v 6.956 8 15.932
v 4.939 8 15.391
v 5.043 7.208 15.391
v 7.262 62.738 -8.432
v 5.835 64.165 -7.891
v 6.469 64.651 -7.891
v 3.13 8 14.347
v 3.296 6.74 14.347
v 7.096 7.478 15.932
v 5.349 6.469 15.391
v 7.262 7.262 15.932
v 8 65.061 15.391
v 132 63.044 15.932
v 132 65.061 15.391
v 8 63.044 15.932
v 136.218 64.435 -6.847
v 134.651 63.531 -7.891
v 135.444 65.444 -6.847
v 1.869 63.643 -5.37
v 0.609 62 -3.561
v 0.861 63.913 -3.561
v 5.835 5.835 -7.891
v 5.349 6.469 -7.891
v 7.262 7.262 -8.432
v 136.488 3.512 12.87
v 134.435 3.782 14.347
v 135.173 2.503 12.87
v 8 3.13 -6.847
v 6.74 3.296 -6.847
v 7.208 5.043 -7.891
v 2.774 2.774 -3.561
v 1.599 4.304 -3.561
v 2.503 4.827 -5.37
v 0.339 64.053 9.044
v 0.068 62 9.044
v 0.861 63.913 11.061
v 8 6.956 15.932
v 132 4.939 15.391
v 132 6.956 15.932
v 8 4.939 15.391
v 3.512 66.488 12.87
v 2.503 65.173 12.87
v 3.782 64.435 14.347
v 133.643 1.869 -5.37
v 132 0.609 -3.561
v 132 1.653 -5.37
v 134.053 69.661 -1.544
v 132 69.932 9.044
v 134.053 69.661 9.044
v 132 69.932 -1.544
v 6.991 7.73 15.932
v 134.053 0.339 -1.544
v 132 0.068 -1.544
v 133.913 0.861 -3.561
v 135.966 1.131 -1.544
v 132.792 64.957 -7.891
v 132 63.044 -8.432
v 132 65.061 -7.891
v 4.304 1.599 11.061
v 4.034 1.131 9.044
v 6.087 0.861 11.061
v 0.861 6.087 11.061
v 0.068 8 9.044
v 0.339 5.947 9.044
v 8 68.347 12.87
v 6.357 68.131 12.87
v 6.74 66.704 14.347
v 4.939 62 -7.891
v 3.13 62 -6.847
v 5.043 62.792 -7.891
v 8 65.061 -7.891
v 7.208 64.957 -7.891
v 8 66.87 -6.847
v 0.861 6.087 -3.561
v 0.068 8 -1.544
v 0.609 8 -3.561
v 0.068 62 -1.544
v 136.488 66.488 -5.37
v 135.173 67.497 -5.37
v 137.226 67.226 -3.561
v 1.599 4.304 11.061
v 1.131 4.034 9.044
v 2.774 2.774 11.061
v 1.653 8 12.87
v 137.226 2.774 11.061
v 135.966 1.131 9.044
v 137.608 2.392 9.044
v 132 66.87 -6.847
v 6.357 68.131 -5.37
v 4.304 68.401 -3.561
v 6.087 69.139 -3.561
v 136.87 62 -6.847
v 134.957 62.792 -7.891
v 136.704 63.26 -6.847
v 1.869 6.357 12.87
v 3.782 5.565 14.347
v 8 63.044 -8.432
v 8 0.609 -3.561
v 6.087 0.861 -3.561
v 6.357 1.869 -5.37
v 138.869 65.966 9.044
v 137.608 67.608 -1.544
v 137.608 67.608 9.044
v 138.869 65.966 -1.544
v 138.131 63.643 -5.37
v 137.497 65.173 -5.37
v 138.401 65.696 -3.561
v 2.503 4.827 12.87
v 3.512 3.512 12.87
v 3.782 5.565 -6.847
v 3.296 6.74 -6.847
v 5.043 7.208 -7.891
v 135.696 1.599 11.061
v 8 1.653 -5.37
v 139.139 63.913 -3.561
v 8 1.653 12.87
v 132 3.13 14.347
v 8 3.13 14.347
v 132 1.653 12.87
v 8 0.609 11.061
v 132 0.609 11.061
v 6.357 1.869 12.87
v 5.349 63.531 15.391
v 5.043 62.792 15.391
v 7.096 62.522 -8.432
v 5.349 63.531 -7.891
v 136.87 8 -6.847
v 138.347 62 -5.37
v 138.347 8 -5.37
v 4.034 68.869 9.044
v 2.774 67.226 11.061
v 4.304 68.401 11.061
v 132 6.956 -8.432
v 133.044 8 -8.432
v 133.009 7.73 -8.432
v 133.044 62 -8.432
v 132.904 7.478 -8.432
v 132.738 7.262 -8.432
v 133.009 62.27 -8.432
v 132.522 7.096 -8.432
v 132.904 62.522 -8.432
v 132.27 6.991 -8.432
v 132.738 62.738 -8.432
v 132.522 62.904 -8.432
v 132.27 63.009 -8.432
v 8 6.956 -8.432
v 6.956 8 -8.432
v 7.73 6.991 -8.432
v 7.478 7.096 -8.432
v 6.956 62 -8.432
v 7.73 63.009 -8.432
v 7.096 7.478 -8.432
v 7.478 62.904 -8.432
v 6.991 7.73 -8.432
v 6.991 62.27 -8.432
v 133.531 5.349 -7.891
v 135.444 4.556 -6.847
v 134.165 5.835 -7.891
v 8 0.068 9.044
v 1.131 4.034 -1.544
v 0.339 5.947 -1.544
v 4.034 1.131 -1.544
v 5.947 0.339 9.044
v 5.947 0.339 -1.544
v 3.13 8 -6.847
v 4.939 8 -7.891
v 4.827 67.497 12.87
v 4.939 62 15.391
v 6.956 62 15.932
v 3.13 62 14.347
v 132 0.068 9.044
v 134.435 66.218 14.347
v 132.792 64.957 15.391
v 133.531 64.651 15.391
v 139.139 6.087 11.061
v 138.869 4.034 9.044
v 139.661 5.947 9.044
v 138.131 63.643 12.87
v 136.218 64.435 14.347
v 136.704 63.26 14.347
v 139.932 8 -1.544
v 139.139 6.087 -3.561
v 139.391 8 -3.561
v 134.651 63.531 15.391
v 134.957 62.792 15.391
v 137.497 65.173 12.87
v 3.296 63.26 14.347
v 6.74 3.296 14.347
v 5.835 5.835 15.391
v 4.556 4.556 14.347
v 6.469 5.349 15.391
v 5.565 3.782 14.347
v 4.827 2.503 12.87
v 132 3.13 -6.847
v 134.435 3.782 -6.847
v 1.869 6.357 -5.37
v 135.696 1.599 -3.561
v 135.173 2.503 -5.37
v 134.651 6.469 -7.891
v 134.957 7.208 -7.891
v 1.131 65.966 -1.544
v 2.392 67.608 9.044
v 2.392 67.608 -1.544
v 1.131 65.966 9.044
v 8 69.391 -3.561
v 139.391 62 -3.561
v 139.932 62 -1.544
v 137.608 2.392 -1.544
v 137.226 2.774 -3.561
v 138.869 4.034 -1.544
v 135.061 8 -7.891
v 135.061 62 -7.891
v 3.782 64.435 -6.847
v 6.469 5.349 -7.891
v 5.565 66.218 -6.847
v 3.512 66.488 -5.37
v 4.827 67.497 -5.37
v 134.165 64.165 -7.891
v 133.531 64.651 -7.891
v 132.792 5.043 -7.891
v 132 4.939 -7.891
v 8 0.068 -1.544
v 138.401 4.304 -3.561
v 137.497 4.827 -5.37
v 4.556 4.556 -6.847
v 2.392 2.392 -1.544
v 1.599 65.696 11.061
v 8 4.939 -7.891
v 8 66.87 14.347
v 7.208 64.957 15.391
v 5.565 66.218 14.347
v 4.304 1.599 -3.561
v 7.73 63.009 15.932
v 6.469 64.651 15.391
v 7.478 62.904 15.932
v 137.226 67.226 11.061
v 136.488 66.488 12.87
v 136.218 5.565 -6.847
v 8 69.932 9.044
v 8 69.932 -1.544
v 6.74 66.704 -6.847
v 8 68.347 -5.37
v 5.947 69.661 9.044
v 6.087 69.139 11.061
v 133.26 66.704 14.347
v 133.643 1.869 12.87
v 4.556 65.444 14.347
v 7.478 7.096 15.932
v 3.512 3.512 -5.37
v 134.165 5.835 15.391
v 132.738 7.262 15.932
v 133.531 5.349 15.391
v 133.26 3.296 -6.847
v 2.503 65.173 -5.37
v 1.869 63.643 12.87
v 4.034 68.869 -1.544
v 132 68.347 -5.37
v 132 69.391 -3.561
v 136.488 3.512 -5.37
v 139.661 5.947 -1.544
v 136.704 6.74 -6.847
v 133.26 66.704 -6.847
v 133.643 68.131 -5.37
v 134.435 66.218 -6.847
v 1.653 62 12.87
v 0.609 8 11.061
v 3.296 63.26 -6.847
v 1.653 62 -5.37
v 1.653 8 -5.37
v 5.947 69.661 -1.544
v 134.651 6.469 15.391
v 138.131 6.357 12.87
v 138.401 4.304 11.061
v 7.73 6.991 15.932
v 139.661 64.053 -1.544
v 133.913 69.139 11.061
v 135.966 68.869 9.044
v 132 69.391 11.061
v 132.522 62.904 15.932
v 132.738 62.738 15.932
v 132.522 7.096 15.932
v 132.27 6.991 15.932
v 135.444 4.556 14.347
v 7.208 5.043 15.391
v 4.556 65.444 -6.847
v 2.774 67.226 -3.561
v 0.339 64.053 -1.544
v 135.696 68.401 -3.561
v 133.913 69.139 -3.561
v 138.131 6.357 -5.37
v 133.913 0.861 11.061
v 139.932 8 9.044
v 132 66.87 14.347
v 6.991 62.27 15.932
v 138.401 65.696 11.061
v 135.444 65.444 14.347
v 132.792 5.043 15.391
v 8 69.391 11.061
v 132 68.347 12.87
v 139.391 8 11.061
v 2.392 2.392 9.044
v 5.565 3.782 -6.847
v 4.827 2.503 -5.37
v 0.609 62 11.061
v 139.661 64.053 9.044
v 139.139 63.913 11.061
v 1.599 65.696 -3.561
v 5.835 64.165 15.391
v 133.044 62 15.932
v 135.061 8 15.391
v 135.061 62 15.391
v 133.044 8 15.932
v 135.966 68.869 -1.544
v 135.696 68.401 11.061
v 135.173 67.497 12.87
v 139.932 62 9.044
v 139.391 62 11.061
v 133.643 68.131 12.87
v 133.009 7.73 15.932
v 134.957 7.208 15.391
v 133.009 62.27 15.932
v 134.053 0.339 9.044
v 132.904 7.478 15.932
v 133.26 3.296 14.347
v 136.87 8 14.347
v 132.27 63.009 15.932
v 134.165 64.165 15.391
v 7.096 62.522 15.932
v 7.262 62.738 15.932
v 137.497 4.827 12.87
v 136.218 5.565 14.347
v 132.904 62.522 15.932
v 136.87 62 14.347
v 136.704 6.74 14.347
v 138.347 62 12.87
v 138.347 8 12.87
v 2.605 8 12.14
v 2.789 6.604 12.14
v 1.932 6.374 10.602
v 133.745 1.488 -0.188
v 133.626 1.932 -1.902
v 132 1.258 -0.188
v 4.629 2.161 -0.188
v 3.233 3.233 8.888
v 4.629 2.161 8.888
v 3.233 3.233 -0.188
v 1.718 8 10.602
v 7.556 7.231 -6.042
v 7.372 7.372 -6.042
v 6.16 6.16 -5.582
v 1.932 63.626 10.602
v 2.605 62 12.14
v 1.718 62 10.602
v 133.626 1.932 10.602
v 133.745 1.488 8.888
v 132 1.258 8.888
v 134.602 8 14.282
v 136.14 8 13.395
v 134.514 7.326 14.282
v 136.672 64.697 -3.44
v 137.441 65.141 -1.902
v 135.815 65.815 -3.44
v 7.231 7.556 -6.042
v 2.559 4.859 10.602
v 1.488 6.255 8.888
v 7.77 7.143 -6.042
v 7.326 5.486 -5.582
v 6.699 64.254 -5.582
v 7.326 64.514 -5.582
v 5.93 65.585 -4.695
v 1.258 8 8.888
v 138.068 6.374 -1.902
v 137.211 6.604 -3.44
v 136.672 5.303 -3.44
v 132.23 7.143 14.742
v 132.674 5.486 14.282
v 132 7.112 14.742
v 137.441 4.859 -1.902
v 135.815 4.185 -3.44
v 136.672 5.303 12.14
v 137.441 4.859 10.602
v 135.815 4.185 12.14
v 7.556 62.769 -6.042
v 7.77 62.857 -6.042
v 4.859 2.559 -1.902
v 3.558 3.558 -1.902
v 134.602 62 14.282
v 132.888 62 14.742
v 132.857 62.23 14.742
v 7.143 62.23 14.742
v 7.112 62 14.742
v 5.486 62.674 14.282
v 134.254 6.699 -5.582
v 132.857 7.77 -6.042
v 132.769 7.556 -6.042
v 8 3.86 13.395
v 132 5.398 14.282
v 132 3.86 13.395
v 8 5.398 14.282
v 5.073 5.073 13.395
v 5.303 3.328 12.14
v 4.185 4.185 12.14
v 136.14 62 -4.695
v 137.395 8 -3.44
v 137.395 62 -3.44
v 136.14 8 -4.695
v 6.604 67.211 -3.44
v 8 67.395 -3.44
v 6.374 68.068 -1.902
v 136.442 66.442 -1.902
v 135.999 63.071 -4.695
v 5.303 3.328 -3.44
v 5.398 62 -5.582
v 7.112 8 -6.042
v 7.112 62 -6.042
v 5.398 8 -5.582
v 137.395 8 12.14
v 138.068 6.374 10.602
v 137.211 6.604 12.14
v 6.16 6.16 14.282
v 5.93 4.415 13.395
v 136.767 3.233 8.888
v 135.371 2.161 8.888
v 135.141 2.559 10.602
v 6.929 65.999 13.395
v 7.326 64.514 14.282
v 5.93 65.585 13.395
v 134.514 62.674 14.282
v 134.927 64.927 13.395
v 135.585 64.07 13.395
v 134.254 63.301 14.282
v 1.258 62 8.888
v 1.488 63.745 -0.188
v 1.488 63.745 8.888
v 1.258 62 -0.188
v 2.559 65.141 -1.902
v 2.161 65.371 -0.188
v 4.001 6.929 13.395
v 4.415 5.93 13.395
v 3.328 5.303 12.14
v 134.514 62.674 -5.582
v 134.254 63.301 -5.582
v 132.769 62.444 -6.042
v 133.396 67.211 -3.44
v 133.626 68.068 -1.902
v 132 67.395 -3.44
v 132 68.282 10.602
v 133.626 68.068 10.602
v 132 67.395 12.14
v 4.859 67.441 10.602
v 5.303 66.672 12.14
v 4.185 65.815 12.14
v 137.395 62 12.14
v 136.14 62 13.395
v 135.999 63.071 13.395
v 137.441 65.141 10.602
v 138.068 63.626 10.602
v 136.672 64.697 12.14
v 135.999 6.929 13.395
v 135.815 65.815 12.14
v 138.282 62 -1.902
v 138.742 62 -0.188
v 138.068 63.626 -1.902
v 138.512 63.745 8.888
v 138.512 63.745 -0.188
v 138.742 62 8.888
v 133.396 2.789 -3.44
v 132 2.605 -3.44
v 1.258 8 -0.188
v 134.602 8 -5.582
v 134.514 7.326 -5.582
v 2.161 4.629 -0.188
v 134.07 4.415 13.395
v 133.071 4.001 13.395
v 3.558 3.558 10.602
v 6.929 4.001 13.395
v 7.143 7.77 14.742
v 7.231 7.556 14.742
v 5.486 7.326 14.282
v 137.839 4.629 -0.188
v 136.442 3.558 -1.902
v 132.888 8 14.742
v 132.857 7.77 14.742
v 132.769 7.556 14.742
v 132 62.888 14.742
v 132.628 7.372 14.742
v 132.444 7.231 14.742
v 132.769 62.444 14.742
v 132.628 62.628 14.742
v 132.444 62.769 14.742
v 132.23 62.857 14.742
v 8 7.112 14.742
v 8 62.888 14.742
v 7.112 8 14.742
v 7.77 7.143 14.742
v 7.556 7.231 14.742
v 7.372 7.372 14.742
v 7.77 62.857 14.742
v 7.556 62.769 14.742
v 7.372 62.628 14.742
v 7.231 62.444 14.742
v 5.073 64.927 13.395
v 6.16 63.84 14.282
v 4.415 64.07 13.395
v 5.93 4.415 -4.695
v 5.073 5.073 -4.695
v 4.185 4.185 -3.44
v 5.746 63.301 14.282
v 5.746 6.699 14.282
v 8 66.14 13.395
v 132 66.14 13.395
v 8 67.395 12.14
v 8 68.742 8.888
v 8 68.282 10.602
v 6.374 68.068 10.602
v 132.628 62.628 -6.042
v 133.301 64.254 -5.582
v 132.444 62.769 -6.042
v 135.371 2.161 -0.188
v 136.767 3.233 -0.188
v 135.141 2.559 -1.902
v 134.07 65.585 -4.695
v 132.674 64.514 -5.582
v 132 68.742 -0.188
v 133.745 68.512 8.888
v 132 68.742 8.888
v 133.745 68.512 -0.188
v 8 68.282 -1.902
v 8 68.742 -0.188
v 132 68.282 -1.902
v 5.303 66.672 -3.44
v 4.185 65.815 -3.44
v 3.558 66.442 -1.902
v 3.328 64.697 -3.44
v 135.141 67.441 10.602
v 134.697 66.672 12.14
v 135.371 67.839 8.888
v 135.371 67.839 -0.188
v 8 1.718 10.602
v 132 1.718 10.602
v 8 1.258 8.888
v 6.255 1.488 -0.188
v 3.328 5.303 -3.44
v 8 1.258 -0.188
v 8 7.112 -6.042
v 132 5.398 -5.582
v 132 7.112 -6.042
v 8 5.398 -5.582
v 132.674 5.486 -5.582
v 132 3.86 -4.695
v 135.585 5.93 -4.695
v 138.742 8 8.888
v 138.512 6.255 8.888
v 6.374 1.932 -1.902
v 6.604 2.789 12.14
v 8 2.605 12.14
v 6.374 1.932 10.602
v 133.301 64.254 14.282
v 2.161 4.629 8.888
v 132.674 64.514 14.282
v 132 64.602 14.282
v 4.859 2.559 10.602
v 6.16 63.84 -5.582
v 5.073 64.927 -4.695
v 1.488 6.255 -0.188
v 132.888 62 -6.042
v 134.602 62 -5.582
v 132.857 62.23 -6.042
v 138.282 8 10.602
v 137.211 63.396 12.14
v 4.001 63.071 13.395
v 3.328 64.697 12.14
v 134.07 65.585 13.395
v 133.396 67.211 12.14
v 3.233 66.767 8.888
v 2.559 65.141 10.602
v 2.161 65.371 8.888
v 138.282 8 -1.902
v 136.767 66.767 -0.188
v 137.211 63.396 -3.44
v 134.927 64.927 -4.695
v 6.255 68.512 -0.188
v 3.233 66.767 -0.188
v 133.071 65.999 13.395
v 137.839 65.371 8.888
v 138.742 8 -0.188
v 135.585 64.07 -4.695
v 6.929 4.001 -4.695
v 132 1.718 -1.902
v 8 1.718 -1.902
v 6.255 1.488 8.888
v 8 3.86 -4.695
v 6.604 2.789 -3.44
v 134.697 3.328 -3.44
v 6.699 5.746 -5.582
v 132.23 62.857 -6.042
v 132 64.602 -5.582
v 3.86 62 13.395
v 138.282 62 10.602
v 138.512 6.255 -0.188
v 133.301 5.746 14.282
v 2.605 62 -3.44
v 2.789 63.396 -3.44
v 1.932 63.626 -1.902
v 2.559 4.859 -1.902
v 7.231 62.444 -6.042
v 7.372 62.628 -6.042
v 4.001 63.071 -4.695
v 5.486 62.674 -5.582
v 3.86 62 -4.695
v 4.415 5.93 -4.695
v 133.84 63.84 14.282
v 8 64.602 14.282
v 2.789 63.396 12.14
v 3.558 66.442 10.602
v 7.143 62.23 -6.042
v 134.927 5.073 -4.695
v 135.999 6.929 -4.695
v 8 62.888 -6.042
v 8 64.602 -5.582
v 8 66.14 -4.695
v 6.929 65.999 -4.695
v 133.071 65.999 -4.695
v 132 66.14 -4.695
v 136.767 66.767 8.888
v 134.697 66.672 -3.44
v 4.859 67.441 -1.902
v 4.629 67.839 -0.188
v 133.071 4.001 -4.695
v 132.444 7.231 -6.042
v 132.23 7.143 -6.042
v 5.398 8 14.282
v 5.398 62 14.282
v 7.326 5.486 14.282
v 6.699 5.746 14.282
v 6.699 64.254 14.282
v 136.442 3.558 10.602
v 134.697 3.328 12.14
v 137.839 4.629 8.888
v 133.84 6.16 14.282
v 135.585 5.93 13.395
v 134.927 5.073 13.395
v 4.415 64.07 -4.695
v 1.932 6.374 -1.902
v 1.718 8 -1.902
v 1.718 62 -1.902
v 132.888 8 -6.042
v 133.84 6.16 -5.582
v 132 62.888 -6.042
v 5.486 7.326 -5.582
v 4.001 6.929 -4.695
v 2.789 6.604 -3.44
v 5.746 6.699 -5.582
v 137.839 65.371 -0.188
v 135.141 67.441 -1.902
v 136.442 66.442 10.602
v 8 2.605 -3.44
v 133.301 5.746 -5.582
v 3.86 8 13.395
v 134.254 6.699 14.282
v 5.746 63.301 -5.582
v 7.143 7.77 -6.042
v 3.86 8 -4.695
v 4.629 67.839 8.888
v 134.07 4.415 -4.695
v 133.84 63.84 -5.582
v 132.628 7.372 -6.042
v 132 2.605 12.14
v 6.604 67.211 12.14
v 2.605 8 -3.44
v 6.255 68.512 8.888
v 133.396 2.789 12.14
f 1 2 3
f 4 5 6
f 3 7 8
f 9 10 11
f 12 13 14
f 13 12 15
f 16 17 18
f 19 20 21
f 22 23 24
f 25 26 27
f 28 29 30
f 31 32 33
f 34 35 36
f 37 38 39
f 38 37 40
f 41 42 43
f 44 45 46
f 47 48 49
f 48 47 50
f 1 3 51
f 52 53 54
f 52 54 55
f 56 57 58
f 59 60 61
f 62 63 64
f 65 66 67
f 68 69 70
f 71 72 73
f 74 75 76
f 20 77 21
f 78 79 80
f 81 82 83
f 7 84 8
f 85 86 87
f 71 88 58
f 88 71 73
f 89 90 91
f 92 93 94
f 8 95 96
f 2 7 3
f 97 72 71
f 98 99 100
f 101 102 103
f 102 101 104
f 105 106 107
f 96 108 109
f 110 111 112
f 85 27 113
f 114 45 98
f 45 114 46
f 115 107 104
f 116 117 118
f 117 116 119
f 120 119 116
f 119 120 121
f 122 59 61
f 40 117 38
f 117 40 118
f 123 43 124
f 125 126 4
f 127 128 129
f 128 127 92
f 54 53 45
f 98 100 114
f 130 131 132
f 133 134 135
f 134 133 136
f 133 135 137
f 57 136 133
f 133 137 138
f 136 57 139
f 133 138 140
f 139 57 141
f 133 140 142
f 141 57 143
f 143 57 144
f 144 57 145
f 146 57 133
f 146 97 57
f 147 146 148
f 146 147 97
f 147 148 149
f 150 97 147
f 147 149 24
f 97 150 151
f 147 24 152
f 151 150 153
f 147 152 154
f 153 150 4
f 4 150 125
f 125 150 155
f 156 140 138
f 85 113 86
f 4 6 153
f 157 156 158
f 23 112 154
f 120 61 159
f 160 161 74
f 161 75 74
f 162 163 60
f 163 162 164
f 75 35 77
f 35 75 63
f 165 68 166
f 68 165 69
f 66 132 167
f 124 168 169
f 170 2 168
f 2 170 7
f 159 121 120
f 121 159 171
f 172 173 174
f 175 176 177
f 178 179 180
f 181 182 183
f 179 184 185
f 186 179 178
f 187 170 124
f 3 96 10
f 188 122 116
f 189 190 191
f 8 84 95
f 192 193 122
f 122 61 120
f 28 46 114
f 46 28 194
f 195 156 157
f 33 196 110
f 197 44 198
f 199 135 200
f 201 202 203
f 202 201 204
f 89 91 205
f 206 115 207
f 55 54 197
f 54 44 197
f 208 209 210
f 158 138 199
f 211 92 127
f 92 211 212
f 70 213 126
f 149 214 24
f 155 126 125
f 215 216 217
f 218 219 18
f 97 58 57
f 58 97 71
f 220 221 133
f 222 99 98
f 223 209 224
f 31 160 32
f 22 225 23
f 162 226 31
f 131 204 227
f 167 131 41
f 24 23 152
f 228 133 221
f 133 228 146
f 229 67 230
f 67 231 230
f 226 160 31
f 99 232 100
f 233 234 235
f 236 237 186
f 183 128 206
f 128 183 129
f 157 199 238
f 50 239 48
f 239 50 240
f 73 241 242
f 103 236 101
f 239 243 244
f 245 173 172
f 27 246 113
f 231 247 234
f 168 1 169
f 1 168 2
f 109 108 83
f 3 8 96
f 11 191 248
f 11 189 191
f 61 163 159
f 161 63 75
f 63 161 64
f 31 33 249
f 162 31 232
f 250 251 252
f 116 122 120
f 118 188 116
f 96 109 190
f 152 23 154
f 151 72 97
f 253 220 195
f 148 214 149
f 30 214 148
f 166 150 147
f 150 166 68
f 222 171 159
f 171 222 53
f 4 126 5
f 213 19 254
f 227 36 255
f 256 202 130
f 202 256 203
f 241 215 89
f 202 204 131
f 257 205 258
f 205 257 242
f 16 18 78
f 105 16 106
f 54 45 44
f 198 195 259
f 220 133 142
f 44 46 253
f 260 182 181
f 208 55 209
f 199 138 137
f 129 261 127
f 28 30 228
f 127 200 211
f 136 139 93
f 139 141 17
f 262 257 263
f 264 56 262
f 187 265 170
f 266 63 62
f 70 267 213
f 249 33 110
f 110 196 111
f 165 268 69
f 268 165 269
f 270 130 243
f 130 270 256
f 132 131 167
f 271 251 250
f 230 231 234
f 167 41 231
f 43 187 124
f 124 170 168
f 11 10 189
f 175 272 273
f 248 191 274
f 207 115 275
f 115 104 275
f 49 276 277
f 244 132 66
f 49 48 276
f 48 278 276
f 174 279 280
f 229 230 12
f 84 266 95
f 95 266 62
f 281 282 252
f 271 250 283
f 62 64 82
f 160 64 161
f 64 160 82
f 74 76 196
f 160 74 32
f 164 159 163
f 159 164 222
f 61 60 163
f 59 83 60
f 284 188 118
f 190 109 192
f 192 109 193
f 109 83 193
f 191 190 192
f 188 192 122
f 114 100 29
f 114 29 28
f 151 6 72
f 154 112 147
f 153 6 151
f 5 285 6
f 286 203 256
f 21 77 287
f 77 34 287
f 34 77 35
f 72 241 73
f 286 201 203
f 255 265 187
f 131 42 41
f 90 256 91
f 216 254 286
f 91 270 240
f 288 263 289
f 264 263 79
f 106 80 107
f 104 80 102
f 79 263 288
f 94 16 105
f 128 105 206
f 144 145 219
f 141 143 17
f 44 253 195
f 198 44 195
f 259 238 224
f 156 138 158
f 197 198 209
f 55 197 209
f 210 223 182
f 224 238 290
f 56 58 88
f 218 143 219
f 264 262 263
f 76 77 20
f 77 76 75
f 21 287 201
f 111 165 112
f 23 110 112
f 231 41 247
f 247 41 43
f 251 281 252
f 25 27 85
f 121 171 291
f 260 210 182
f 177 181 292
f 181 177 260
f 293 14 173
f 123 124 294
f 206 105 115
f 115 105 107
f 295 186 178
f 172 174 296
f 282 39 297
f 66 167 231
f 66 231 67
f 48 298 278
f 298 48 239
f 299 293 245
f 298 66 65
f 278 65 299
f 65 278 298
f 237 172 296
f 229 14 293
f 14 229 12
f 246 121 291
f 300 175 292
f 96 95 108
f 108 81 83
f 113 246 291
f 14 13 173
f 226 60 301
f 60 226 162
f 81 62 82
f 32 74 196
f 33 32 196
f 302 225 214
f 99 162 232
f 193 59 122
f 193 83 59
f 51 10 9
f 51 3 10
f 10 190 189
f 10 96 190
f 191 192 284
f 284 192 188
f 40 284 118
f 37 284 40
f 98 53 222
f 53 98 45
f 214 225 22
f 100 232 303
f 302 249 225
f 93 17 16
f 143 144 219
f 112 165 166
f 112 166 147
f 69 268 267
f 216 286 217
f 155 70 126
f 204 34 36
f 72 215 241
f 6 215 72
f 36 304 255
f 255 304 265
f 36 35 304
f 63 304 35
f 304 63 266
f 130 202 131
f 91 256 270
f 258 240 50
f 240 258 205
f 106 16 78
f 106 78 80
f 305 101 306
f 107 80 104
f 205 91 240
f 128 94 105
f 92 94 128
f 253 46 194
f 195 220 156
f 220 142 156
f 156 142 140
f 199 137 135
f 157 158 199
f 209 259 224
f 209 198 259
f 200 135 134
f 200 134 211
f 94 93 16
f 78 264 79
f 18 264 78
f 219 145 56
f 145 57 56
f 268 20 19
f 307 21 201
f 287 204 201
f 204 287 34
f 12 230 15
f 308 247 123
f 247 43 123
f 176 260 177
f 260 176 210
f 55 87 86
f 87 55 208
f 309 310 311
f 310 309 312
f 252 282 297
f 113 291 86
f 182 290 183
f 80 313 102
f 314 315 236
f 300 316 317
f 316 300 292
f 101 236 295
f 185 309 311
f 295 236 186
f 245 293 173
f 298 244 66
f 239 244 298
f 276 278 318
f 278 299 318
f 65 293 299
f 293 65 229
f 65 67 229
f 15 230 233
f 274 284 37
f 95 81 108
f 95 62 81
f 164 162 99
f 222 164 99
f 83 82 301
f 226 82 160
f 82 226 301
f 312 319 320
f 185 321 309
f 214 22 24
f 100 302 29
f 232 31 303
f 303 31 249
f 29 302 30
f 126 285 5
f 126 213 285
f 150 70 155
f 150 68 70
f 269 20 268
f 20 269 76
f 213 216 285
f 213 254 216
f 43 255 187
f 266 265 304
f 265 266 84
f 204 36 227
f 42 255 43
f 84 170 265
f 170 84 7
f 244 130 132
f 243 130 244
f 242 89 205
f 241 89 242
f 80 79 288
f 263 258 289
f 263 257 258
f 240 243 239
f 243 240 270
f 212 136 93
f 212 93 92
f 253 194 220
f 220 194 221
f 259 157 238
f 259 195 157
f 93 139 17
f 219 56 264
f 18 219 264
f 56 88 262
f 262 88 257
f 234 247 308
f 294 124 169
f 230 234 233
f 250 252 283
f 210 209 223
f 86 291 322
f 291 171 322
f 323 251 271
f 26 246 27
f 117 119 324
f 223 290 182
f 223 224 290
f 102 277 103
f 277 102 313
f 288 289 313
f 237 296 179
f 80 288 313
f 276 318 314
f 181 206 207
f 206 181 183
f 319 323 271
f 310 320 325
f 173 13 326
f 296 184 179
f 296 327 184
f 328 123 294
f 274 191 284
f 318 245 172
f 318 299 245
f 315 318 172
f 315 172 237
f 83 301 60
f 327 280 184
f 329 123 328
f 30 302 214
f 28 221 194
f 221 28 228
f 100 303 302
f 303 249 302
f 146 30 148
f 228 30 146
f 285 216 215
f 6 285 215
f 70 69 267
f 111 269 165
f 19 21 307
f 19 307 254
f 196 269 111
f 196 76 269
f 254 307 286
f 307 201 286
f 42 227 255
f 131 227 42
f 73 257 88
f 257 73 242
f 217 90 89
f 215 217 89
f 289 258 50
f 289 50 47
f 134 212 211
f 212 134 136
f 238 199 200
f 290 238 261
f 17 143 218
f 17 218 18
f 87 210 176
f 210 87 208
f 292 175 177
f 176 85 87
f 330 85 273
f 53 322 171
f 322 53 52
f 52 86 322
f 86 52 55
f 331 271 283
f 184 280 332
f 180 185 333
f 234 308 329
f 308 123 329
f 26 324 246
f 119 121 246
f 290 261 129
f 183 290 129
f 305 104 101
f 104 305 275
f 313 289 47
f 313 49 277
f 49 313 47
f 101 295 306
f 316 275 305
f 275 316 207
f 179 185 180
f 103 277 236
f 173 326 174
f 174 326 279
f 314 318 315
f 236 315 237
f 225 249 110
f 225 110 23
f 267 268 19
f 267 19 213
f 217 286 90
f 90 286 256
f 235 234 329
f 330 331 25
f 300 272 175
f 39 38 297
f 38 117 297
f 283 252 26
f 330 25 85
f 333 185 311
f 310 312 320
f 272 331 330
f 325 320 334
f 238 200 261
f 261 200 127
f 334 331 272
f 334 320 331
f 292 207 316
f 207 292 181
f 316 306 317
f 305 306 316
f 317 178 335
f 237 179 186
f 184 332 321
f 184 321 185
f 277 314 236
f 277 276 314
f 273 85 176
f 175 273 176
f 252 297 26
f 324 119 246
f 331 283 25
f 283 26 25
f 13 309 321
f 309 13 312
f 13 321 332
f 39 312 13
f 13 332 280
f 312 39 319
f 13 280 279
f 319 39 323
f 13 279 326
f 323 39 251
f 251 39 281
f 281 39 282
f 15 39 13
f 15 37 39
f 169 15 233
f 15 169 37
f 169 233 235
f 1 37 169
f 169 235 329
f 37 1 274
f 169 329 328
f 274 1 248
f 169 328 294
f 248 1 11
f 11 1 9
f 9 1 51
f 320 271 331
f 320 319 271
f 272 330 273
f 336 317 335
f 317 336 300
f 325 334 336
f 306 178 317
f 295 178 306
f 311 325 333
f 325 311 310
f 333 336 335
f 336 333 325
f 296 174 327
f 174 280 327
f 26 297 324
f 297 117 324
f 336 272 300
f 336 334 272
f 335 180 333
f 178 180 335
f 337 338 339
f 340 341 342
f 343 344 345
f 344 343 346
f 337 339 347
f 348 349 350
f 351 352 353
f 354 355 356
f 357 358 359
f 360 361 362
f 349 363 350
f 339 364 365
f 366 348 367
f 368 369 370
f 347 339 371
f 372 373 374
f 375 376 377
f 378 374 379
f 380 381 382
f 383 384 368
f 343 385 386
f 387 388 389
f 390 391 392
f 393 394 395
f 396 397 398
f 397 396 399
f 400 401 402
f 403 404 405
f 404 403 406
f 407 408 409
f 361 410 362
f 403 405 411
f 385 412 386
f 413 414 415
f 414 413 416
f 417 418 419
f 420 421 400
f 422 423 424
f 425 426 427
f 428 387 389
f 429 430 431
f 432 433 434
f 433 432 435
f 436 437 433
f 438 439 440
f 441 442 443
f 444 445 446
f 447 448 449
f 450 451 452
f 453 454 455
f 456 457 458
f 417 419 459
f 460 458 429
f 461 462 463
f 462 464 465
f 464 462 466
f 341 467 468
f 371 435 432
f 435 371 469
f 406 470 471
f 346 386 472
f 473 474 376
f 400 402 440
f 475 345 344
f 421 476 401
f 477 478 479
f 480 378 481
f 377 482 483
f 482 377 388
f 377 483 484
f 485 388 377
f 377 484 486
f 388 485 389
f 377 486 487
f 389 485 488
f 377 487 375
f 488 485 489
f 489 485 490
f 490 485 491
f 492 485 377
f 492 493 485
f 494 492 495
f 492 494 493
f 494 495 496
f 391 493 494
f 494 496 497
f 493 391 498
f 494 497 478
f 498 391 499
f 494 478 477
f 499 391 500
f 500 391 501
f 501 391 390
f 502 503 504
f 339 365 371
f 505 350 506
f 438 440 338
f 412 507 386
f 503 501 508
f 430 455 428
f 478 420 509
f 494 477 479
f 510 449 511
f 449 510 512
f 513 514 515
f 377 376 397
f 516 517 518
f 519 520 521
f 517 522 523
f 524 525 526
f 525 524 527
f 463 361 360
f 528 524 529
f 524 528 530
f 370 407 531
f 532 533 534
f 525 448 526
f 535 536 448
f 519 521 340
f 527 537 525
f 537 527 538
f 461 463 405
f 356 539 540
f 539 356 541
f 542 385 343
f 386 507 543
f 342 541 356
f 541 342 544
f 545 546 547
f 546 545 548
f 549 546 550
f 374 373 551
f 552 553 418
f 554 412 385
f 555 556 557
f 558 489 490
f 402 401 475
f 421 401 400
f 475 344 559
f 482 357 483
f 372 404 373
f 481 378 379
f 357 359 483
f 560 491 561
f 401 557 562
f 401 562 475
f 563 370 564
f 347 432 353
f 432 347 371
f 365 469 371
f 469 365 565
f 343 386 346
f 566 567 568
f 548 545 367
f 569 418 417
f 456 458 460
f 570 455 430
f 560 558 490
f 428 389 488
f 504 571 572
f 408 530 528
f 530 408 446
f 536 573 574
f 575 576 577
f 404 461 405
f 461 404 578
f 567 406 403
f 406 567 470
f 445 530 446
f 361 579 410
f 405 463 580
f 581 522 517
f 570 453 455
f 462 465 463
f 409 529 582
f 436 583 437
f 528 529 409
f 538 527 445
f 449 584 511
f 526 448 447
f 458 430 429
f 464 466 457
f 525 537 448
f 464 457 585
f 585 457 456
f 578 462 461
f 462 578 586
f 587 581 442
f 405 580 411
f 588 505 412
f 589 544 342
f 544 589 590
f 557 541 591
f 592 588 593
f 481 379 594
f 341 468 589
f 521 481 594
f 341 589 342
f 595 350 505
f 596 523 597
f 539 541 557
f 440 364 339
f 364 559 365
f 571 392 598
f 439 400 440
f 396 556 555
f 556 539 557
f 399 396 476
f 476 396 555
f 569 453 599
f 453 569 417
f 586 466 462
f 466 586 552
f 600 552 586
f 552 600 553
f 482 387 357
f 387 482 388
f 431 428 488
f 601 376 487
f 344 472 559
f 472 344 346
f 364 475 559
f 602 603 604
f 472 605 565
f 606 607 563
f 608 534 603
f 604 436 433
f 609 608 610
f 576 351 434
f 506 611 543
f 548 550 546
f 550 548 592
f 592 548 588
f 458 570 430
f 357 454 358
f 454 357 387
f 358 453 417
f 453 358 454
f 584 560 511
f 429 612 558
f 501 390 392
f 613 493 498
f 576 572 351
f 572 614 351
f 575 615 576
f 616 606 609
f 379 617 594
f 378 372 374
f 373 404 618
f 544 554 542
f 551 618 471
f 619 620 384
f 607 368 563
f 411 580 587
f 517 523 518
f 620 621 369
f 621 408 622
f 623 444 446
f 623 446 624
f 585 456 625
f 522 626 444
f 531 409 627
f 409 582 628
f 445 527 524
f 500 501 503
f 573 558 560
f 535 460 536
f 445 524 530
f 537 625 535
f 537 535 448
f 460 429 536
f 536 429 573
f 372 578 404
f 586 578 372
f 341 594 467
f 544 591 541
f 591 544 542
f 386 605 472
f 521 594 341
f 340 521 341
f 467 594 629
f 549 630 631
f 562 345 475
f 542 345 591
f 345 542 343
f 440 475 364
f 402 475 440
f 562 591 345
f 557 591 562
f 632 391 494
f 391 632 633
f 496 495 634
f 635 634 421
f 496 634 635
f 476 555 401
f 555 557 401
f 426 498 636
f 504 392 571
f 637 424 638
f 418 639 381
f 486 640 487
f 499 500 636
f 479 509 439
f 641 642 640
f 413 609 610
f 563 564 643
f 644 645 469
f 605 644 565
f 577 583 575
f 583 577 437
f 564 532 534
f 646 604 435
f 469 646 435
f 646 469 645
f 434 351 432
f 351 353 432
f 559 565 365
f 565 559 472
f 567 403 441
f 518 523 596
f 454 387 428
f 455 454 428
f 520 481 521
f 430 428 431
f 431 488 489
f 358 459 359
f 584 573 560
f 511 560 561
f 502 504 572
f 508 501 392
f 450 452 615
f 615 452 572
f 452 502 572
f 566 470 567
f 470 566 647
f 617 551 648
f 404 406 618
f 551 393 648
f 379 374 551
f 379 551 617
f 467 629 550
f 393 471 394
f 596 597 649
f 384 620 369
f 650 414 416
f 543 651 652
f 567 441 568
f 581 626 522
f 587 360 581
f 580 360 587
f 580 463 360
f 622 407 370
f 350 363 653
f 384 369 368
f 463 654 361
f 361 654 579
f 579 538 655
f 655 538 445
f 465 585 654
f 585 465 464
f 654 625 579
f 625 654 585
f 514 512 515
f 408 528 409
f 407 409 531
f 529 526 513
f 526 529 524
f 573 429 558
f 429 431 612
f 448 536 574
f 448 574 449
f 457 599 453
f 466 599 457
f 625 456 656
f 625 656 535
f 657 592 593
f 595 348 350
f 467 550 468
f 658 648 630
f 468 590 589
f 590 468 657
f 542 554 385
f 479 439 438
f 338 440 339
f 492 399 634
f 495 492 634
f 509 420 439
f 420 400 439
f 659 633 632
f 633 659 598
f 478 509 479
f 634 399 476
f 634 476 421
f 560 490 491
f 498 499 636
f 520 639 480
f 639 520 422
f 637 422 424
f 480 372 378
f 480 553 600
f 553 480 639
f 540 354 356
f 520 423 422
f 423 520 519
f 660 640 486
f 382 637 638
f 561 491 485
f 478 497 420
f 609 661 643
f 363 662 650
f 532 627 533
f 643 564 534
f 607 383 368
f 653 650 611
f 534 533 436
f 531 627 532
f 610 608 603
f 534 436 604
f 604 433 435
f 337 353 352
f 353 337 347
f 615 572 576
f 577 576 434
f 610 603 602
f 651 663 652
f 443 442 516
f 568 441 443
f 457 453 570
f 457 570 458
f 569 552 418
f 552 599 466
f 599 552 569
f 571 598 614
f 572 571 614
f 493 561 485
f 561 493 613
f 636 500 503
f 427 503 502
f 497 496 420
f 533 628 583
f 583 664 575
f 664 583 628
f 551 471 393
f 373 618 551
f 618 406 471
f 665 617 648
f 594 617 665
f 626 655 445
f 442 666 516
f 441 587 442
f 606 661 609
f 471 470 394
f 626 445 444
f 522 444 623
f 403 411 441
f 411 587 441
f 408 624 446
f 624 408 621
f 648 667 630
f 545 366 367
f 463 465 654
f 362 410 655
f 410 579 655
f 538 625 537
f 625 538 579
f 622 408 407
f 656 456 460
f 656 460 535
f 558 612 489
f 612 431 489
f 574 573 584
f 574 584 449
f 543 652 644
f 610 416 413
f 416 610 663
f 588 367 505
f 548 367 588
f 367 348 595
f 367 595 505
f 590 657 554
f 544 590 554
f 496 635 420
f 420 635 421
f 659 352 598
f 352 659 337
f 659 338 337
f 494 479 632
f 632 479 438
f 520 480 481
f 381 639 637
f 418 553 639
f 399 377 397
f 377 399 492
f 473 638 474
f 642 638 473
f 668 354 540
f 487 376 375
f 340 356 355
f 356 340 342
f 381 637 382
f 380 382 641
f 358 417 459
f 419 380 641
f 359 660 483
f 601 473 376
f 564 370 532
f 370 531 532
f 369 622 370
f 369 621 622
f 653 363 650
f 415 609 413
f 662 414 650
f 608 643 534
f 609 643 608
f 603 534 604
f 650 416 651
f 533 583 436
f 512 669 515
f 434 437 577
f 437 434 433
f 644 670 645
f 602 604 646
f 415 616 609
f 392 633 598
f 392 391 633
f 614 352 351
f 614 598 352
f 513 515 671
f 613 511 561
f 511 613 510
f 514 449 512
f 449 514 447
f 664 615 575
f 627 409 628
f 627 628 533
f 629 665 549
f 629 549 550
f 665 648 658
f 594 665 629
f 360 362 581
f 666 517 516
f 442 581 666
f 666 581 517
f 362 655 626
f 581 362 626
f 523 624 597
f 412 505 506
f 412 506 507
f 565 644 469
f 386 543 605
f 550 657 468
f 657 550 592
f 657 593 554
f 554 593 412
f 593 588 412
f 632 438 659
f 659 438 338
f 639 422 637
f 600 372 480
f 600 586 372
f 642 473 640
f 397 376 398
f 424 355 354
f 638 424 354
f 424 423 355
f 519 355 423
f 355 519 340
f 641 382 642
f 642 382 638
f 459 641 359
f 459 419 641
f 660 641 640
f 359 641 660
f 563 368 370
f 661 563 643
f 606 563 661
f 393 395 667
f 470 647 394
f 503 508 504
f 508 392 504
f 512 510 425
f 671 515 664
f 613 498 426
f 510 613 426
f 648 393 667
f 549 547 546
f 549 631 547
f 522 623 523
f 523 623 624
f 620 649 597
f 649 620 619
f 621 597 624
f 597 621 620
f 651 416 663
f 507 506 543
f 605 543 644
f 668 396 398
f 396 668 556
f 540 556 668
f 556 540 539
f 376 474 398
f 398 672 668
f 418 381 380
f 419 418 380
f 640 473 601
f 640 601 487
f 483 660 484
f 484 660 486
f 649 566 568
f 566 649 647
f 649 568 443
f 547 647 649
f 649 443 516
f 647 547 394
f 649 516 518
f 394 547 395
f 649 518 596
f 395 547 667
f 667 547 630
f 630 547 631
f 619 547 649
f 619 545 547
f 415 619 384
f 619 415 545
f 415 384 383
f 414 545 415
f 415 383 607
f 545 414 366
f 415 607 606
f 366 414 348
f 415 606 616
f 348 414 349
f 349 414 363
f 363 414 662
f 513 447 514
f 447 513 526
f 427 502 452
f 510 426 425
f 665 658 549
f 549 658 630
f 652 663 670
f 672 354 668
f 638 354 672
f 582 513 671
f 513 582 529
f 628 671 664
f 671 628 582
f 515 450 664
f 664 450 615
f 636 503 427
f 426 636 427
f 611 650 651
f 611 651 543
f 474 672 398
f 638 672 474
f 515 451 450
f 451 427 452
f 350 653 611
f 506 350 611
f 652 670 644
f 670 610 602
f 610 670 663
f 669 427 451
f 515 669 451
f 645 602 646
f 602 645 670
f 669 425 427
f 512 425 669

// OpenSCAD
device_length = 140;
device_width = 70;
device_thickness = 7.5;
wall = 1.2;
corner_r = 8;
display_window = [58, 44];
speaker_slot = [14, 2.2];
usb_cutout = [10, 4];

module rounded_box(size=[10,10,10], r=2) {
  hull() {
    for (x = [r, size[0]-r])
      for (y = [r, size[1]-r])
        for (z = [r, size[2]-r])
          translate([x,y,z]) sphere(r=r, $fn=24);
  }
}

module shell_outer() {
  rounded_box([device_length, device_width, device_thickness], corner_r);
}

module shell_inner() {
  translate([wall, wall, wall])
    rounded_box(
      [device_length - 2*wall, device_width - 2*wall, device_thickness - wall],
      max(corner_r - wall, 2)
    );
}

module front_features() {
  translate([41, 13, device_thickness - wall - 0.2])
    cube([display_window[0], display_window[1], wall + 1]);
  translate([device_length/2 - speaker_slot[0]/2, 8, device_thickness - wall - 0.2])
    cube([speaker_slot[0], speaker_slot[1], wall + 1]);
}

module bottom_features() {
  translate([device_length/2 - usb_cutout[0]/2, device_width - wall - 0.2, 1.8])
    rotate([90,0,0]) cube([usb_cutout[0], usb_cutout[1], wall + 1]);
}

difference() {
  shell_outer();
  shell_inner();
  front_features();
  bottom_features();
}
